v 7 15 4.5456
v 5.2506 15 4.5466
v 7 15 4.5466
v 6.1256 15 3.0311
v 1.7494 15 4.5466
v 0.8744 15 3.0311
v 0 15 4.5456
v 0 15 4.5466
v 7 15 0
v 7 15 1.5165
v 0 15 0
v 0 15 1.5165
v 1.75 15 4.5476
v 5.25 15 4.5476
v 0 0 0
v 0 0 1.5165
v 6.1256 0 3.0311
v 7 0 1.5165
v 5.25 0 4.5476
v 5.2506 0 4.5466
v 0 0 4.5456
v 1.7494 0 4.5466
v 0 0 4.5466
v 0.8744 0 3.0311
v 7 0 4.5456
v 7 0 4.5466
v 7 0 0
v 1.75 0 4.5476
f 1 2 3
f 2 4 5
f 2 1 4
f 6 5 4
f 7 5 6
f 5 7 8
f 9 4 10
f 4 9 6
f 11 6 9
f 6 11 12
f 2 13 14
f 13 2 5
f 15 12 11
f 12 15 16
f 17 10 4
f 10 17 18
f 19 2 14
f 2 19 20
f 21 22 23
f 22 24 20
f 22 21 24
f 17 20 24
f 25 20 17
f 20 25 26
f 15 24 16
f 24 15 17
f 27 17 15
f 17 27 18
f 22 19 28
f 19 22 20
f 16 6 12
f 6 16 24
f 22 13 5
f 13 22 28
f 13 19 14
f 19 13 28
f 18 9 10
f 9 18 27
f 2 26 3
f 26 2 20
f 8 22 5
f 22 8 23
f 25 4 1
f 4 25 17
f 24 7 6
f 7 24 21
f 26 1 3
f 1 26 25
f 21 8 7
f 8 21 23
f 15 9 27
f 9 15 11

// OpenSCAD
/*
This file is part of Diabolobox - a library to design 3D printable boxes.
Copyright (C) 2024  Luc Milland

Diabolobox is free software: you can redistribute it and/or
modify it under the terms of the GNU General Public License
as published by the Free Software Foundation, either version 3
of the License, or (at your option) any later version.

Diabolobox is distributed in the hope that it will be useful, 
but WITHOUT ANY WARRANTY; without even the implied warranty of
MERCHANTABILITY or FITNESS FOR A PARTICULAR PURPOSE. See the 
GNU General Public License for more details.

You should have received a copy of the GNU General Public License
along with Diabolobox. If not, see <https://www.gnu.org/licenses/>
*/

a = 60; // dovetail angle
function dt_height(width) = width * tan(a)/4;
function dt_top_width(width) = 2*dt_height(width)/tan(a);
function diabolo_height(width) = dt_height(width)*1.5;
  
module dove_tail(width, depth) {
  x1 = width;
  h = dt_height(width);
  x2 = dt_top_width(width);
  
  translate([0, depth, 0])
  rotate([90, 0, 0]) 
  linear_extrude(depth)
  hull() {
    square([x1, 0.001]);
    translate([(x1-x2)/2, h]) square([x2, 0.001]);
  }      
}

module position(position, width) {
                          //           rotation     translation   
  transform = position == "left"   ? [[0, 90, 0],  [0, 0, width]] :
              position == "top"    ? [[0, 180, 0], [width, 0, diabolo_height(width)]] :
              position == "right"  ? [[0, -90, 0], [diabolo_height(width), 0, 0]] :
              position == "bottom" ? [[0, 0, 0],   [0, 0, 0]] : undef;
  assert(!is_undef(transform), str("position as to be 'left', 'top', 'right' or 'bottom'"));
  translate(transform[1]) rotate(transform[0]) children();
}

module __diabolo(width, depth) {
  dth = dt_height(width);
   translate([0, 0, dth/2]) {
     dove_tail(width, depth);
     translate([0, 0, dth]) mirror([0, 0, 1]) dove_tail(width, depth);
     translate([0, 0, -dth/2]) mirror([0, 0, 0]) cube([width, depth, dth/2]);
   }
}

module diabolo(width, depth, position) {
  position(position, width)  __diabolo(width, depth);
}

diabolo(7, 15, "bottom");
